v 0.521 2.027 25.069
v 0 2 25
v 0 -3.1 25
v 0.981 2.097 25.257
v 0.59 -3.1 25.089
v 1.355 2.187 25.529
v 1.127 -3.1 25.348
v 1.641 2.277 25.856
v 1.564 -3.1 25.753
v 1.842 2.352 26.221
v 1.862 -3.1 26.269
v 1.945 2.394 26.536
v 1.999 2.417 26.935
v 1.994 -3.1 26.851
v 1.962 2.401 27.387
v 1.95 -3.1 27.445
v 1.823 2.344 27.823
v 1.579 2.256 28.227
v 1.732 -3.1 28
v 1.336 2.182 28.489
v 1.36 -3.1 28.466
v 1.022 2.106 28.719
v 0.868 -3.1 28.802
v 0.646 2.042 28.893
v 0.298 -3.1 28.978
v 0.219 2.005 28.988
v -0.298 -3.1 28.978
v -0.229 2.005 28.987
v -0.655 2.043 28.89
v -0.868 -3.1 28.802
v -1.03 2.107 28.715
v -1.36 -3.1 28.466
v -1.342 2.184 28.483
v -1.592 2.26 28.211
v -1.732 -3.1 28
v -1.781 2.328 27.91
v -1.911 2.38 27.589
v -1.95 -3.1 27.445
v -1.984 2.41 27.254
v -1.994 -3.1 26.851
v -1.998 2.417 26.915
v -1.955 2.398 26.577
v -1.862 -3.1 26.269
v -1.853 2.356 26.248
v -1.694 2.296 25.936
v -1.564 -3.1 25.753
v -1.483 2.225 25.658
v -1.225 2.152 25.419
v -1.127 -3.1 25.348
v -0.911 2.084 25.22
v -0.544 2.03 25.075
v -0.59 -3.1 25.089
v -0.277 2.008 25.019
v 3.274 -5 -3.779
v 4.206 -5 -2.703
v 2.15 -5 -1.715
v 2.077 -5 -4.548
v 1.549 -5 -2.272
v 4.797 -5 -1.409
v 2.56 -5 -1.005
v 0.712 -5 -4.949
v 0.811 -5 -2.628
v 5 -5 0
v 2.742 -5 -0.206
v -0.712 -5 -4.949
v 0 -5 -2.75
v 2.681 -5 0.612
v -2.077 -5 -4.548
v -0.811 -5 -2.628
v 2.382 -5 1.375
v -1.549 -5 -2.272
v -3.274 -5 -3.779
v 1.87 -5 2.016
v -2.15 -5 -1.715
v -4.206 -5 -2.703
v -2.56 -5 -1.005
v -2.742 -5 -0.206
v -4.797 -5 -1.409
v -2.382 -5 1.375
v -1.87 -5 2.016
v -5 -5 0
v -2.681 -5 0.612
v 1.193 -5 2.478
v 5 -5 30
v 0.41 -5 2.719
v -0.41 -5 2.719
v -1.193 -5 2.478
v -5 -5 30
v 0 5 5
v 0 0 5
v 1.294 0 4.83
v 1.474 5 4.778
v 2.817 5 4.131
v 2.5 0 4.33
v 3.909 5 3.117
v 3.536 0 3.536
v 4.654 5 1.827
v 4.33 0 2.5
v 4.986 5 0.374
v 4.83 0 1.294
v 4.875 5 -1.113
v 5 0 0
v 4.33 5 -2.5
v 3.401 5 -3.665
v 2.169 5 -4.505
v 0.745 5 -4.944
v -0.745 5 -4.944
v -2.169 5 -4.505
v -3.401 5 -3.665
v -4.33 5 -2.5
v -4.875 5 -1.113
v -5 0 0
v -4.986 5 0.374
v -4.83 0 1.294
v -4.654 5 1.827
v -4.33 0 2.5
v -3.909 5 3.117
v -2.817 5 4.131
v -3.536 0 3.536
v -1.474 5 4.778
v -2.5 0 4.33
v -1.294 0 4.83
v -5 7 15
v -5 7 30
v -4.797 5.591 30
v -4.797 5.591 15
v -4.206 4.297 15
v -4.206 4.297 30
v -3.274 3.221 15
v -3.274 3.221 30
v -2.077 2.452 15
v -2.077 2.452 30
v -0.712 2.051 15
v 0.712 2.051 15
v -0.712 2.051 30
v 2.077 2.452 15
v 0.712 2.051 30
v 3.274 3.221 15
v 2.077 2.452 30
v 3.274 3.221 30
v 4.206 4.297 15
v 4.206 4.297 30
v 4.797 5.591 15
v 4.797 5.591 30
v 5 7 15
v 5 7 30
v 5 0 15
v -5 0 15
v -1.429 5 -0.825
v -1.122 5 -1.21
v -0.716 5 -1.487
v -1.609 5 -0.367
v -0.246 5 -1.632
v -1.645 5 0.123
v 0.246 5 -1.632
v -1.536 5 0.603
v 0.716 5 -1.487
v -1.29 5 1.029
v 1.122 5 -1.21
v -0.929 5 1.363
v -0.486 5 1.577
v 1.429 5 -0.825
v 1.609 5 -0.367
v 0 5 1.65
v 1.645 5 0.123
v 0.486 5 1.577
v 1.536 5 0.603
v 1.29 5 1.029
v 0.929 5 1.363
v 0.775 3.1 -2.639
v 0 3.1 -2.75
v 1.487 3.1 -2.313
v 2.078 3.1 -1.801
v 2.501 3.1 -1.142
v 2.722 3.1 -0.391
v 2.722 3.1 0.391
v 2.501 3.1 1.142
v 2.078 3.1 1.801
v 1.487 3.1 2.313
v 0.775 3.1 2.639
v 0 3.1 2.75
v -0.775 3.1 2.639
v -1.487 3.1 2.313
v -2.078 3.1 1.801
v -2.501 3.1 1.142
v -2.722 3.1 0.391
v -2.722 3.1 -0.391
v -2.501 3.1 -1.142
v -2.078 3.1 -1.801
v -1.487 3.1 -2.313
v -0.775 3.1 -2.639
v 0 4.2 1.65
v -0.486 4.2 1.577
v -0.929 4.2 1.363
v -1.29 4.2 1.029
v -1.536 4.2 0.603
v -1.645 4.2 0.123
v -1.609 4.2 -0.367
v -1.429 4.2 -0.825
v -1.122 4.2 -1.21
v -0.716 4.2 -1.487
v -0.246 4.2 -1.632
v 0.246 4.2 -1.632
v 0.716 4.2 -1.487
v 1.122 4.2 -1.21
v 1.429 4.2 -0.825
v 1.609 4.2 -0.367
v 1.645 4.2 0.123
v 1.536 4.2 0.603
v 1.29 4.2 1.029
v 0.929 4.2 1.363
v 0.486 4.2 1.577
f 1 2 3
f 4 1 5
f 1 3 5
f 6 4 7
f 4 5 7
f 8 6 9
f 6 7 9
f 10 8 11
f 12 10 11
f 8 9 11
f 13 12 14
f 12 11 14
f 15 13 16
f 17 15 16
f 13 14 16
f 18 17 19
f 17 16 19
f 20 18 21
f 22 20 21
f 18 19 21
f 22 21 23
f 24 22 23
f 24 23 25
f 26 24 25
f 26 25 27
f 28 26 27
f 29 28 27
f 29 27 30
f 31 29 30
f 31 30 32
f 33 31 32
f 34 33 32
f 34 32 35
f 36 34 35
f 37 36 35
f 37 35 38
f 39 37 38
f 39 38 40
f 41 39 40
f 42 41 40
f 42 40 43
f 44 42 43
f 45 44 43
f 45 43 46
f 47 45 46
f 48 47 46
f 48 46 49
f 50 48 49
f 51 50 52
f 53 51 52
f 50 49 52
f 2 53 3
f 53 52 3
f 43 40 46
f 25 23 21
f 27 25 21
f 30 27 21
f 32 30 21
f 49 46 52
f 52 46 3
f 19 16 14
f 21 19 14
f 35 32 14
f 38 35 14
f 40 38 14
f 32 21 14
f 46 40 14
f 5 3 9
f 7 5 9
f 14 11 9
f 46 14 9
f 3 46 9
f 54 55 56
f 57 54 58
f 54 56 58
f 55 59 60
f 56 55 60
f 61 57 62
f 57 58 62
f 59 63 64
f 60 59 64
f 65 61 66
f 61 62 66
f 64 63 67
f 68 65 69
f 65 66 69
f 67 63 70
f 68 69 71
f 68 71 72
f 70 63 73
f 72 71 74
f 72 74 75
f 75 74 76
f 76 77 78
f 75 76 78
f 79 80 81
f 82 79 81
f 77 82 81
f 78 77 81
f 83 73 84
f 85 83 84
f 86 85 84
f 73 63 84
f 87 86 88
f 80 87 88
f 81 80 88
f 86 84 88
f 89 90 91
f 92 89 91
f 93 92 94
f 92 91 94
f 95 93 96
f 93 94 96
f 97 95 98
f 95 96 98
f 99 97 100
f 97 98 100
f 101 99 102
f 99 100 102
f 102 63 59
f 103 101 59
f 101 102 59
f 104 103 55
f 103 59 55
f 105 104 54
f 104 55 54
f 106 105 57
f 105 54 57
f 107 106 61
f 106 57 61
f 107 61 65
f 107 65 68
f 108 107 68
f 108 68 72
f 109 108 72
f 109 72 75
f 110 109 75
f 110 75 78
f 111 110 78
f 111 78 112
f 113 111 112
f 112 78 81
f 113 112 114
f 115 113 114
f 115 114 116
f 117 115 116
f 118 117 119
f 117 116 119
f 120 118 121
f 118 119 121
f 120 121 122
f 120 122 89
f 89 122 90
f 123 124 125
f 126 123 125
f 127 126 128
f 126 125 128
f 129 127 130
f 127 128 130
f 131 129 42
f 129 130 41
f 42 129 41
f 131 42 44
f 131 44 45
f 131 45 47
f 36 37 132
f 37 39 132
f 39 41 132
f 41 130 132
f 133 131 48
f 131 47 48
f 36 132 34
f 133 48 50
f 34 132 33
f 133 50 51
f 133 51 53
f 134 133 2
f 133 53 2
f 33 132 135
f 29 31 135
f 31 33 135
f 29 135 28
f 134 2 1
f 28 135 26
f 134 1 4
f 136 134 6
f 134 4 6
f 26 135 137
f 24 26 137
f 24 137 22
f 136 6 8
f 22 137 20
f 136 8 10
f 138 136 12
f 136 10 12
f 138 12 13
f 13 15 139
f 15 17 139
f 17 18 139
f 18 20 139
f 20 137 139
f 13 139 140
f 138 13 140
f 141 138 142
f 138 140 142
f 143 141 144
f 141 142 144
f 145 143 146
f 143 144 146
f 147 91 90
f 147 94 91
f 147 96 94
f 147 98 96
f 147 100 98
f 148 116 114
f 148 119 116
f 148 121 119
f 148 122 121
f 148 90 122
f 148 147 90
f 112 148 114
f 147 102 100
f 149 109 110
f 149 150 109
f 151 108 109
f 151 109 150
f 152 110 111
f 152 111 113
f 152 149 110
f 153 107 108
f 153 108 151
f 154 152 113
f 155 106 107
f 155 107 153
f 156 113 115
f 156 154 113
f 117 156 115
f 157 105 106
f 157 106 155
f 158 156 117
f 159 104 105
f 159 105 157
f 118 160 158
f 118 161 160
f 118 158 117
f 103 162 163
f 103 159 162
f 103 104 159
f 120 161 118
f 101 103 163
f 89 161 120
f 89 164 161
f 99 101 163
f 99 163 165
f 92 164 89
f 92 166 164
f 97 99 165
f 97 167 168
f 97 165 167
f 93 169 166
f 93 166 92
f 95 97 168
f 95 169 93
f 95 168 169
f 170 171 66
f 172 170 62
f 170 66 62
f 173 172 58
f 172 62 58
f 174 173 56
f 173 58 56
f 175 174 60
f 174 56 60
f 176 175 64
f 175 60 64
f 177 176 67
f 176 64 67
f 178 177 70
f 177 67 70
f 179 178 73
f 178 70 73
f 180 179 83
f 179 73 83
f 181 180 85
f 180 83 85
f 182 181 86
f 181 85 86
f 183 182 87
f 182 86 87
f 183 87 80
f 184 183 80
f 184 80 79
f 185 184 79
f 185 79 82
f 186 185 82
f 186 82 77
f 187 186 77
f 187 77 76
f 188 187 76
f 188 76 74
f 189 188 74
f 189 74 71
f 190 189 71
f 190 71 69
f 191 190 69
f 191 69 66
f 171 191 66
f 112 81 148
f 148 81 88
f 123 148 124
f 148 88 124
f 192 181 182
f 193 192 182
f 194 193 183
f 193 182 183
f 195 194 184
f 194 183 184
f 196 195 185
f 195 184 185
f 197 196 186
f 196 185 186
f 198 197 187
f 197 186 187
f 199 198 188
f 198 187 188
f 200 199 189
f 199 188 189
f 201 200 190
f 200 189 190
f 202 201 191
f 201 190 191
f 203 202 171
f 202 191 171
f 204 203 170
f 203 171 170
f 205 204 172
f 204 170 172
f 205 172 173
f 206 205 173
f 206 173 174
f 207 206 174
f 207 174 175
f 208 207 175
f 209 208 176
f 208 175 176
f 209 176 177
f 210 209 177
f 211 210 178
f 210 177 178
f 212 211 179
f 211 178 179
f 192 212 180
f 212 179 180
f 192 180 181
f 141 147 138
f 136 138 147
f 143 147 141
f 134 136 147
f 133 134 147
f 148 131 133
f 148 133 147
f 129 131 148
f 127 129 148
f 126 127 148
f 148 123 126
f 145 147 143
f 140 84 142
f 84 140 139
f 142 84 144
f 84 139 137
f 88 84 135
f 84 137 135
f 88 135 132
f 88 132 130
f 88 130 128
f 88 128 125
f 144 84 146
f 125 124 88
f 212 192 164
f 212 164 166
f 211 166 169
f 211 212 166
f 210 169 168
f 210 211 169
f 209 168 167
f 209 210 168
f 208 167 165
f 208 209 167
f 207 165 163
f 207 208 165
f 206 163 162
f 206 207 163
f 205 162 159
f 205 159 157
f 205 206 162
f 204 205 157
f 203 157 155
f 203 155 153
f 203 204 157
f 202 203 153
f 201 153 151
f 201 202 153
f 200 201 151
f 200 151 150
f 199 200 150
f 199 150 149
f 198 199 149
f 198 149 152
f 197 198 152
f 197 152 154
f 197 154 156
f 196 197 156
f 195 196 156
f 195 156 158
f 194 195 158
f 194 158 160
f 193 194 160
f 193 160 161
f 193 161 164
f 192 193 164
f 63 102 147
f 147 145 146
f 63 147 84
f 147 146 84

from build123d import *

# Parameters (mm, degrees)
SKETCH1_R           = 5
SKETCH1_R_2         = 1.65
BOSS_EXTRUDE1_DEPTH = 5
BOSS_EXTRUDE2_START = 5
BOSS_EXTRUDE2_DEPTH = 5
BOSS_EXTRUDE3_DEPTH = 15
CUT_EXTRUDE1_START  = -1.9
SKETCH4_R           = 2
CUT_EXTRUDE1_DEPTH  = 31.795565449
SKETCH6_R           = 2.75
CUT_EXTRUDE2_DEPTH  = 8
CHAMFER1_SIZE       = 1.2


with BuildPart() as part:
    # Sketch1 → Boss-Extrude1 (new body)
    with BuildSketch(Plane(origin=(0, 0, 0), x_dir=(1, 0, 0), z_dir=(0, 1, 0))):
        with Locations(Location((0, 0, 0), (0, 0, 270))):
            Circle(SKETCH1_R)
        with Locations(Location((0, 0, 0), (0, 0, 270))):
            Circle(SKETCH1_R_2, mode=Mode.SUBTRACT)
    extrude(amount=BOSS_EXTRUDE1_DEPTH)

    # Sketch2 → Boss-Extrude2 (add)
    with BuildSketch(Plane.XZ.offset(BOSS_EXTRUDE2_START)):
        with BuildLine():
            Line((-5, 0), (-5, 30))
            Line((-5, 30), (5, 30))
            Line((5, 30), (5, 0))
            ThreePointArc((5, 0), (0, -5), (-5, 0))
        make_face()
    extrude(amount=-BOSS_EXTRUDE2_DEPTH)

    # Sketch3 → Boss-Extrude3 (add)
    with BuildSketch(Plane.XY.offset(30)):
        with BuildLine():
            Line((-5, 0), (-5, 7))
            ThreePointArc((-5, 7), (0, 2), (5, 7))
            Line((5, 7), (5, 0))
            Line((5, 0), (5, -5))
            Line((5, -5), (-5, -5))
            Line((-5, -5), (-5, 0))
        make_face()
    extrude(amount=-BOSS_EXTRUDE3_DEPTH)

    # Sketch4 → Cut-Extrude1 (cut, through all)
    with BuildSketch(Plane.XZ.offset(5).offset(CUT_EXTRUDE1_START)):
        with Locations(Location((0, 27, 0), (0, 0, 270))):
            Circle(SKETCH4_R)
    extrude(amount=-CUT_EXTRUDE1_DEPTH, mode=Mode.SUBTRACT)

    # Sketch6 → Cut-Extrude2 (cut)
    with BuildSketch(Plane.XZ.offset(5)):
        with Locations(Location((0, 0, 0), (0, 0, 270))):
            Circle(SKETCH6_R)
    extrude(amount=-CUT_EXTRUDE2_DEPTH, mode=Mode.SUBTRACT)

    # Chamfer1
    # the kernel refuses this chamfer: 1.2 mm, written as the material it takes off along each edge
    with BuildSketch(Plane(origin=(0, 3, 0), x_dir=(0, 0, 1), z_dir=(1, 0, 0))) as chamfer1_piece_1_section:
        Polygon((1.65, -CHAMFER1_SIZE), (1.65 + CHAMFER1_SIZE, 0), (1.65, 0), align=None)
    chamfer1_piece_1 = revolve(axis=Axis((0, 3, 0), (0, -1, 0)), mode=Mode.PRIVATE)
    chamfer1_piece_1 = chamfer1_piece_1 & Plane(origin=(0, 3.651745374, 0), x_dir=(0, 0, -1), z_dir=(0, -1, 0)) * Cylinder(2.75, 12, mode=Mode.PRIVATE)
    add(chamfer1_piece_1, mode=Mode.SUBTRACT)


solid = part.part
